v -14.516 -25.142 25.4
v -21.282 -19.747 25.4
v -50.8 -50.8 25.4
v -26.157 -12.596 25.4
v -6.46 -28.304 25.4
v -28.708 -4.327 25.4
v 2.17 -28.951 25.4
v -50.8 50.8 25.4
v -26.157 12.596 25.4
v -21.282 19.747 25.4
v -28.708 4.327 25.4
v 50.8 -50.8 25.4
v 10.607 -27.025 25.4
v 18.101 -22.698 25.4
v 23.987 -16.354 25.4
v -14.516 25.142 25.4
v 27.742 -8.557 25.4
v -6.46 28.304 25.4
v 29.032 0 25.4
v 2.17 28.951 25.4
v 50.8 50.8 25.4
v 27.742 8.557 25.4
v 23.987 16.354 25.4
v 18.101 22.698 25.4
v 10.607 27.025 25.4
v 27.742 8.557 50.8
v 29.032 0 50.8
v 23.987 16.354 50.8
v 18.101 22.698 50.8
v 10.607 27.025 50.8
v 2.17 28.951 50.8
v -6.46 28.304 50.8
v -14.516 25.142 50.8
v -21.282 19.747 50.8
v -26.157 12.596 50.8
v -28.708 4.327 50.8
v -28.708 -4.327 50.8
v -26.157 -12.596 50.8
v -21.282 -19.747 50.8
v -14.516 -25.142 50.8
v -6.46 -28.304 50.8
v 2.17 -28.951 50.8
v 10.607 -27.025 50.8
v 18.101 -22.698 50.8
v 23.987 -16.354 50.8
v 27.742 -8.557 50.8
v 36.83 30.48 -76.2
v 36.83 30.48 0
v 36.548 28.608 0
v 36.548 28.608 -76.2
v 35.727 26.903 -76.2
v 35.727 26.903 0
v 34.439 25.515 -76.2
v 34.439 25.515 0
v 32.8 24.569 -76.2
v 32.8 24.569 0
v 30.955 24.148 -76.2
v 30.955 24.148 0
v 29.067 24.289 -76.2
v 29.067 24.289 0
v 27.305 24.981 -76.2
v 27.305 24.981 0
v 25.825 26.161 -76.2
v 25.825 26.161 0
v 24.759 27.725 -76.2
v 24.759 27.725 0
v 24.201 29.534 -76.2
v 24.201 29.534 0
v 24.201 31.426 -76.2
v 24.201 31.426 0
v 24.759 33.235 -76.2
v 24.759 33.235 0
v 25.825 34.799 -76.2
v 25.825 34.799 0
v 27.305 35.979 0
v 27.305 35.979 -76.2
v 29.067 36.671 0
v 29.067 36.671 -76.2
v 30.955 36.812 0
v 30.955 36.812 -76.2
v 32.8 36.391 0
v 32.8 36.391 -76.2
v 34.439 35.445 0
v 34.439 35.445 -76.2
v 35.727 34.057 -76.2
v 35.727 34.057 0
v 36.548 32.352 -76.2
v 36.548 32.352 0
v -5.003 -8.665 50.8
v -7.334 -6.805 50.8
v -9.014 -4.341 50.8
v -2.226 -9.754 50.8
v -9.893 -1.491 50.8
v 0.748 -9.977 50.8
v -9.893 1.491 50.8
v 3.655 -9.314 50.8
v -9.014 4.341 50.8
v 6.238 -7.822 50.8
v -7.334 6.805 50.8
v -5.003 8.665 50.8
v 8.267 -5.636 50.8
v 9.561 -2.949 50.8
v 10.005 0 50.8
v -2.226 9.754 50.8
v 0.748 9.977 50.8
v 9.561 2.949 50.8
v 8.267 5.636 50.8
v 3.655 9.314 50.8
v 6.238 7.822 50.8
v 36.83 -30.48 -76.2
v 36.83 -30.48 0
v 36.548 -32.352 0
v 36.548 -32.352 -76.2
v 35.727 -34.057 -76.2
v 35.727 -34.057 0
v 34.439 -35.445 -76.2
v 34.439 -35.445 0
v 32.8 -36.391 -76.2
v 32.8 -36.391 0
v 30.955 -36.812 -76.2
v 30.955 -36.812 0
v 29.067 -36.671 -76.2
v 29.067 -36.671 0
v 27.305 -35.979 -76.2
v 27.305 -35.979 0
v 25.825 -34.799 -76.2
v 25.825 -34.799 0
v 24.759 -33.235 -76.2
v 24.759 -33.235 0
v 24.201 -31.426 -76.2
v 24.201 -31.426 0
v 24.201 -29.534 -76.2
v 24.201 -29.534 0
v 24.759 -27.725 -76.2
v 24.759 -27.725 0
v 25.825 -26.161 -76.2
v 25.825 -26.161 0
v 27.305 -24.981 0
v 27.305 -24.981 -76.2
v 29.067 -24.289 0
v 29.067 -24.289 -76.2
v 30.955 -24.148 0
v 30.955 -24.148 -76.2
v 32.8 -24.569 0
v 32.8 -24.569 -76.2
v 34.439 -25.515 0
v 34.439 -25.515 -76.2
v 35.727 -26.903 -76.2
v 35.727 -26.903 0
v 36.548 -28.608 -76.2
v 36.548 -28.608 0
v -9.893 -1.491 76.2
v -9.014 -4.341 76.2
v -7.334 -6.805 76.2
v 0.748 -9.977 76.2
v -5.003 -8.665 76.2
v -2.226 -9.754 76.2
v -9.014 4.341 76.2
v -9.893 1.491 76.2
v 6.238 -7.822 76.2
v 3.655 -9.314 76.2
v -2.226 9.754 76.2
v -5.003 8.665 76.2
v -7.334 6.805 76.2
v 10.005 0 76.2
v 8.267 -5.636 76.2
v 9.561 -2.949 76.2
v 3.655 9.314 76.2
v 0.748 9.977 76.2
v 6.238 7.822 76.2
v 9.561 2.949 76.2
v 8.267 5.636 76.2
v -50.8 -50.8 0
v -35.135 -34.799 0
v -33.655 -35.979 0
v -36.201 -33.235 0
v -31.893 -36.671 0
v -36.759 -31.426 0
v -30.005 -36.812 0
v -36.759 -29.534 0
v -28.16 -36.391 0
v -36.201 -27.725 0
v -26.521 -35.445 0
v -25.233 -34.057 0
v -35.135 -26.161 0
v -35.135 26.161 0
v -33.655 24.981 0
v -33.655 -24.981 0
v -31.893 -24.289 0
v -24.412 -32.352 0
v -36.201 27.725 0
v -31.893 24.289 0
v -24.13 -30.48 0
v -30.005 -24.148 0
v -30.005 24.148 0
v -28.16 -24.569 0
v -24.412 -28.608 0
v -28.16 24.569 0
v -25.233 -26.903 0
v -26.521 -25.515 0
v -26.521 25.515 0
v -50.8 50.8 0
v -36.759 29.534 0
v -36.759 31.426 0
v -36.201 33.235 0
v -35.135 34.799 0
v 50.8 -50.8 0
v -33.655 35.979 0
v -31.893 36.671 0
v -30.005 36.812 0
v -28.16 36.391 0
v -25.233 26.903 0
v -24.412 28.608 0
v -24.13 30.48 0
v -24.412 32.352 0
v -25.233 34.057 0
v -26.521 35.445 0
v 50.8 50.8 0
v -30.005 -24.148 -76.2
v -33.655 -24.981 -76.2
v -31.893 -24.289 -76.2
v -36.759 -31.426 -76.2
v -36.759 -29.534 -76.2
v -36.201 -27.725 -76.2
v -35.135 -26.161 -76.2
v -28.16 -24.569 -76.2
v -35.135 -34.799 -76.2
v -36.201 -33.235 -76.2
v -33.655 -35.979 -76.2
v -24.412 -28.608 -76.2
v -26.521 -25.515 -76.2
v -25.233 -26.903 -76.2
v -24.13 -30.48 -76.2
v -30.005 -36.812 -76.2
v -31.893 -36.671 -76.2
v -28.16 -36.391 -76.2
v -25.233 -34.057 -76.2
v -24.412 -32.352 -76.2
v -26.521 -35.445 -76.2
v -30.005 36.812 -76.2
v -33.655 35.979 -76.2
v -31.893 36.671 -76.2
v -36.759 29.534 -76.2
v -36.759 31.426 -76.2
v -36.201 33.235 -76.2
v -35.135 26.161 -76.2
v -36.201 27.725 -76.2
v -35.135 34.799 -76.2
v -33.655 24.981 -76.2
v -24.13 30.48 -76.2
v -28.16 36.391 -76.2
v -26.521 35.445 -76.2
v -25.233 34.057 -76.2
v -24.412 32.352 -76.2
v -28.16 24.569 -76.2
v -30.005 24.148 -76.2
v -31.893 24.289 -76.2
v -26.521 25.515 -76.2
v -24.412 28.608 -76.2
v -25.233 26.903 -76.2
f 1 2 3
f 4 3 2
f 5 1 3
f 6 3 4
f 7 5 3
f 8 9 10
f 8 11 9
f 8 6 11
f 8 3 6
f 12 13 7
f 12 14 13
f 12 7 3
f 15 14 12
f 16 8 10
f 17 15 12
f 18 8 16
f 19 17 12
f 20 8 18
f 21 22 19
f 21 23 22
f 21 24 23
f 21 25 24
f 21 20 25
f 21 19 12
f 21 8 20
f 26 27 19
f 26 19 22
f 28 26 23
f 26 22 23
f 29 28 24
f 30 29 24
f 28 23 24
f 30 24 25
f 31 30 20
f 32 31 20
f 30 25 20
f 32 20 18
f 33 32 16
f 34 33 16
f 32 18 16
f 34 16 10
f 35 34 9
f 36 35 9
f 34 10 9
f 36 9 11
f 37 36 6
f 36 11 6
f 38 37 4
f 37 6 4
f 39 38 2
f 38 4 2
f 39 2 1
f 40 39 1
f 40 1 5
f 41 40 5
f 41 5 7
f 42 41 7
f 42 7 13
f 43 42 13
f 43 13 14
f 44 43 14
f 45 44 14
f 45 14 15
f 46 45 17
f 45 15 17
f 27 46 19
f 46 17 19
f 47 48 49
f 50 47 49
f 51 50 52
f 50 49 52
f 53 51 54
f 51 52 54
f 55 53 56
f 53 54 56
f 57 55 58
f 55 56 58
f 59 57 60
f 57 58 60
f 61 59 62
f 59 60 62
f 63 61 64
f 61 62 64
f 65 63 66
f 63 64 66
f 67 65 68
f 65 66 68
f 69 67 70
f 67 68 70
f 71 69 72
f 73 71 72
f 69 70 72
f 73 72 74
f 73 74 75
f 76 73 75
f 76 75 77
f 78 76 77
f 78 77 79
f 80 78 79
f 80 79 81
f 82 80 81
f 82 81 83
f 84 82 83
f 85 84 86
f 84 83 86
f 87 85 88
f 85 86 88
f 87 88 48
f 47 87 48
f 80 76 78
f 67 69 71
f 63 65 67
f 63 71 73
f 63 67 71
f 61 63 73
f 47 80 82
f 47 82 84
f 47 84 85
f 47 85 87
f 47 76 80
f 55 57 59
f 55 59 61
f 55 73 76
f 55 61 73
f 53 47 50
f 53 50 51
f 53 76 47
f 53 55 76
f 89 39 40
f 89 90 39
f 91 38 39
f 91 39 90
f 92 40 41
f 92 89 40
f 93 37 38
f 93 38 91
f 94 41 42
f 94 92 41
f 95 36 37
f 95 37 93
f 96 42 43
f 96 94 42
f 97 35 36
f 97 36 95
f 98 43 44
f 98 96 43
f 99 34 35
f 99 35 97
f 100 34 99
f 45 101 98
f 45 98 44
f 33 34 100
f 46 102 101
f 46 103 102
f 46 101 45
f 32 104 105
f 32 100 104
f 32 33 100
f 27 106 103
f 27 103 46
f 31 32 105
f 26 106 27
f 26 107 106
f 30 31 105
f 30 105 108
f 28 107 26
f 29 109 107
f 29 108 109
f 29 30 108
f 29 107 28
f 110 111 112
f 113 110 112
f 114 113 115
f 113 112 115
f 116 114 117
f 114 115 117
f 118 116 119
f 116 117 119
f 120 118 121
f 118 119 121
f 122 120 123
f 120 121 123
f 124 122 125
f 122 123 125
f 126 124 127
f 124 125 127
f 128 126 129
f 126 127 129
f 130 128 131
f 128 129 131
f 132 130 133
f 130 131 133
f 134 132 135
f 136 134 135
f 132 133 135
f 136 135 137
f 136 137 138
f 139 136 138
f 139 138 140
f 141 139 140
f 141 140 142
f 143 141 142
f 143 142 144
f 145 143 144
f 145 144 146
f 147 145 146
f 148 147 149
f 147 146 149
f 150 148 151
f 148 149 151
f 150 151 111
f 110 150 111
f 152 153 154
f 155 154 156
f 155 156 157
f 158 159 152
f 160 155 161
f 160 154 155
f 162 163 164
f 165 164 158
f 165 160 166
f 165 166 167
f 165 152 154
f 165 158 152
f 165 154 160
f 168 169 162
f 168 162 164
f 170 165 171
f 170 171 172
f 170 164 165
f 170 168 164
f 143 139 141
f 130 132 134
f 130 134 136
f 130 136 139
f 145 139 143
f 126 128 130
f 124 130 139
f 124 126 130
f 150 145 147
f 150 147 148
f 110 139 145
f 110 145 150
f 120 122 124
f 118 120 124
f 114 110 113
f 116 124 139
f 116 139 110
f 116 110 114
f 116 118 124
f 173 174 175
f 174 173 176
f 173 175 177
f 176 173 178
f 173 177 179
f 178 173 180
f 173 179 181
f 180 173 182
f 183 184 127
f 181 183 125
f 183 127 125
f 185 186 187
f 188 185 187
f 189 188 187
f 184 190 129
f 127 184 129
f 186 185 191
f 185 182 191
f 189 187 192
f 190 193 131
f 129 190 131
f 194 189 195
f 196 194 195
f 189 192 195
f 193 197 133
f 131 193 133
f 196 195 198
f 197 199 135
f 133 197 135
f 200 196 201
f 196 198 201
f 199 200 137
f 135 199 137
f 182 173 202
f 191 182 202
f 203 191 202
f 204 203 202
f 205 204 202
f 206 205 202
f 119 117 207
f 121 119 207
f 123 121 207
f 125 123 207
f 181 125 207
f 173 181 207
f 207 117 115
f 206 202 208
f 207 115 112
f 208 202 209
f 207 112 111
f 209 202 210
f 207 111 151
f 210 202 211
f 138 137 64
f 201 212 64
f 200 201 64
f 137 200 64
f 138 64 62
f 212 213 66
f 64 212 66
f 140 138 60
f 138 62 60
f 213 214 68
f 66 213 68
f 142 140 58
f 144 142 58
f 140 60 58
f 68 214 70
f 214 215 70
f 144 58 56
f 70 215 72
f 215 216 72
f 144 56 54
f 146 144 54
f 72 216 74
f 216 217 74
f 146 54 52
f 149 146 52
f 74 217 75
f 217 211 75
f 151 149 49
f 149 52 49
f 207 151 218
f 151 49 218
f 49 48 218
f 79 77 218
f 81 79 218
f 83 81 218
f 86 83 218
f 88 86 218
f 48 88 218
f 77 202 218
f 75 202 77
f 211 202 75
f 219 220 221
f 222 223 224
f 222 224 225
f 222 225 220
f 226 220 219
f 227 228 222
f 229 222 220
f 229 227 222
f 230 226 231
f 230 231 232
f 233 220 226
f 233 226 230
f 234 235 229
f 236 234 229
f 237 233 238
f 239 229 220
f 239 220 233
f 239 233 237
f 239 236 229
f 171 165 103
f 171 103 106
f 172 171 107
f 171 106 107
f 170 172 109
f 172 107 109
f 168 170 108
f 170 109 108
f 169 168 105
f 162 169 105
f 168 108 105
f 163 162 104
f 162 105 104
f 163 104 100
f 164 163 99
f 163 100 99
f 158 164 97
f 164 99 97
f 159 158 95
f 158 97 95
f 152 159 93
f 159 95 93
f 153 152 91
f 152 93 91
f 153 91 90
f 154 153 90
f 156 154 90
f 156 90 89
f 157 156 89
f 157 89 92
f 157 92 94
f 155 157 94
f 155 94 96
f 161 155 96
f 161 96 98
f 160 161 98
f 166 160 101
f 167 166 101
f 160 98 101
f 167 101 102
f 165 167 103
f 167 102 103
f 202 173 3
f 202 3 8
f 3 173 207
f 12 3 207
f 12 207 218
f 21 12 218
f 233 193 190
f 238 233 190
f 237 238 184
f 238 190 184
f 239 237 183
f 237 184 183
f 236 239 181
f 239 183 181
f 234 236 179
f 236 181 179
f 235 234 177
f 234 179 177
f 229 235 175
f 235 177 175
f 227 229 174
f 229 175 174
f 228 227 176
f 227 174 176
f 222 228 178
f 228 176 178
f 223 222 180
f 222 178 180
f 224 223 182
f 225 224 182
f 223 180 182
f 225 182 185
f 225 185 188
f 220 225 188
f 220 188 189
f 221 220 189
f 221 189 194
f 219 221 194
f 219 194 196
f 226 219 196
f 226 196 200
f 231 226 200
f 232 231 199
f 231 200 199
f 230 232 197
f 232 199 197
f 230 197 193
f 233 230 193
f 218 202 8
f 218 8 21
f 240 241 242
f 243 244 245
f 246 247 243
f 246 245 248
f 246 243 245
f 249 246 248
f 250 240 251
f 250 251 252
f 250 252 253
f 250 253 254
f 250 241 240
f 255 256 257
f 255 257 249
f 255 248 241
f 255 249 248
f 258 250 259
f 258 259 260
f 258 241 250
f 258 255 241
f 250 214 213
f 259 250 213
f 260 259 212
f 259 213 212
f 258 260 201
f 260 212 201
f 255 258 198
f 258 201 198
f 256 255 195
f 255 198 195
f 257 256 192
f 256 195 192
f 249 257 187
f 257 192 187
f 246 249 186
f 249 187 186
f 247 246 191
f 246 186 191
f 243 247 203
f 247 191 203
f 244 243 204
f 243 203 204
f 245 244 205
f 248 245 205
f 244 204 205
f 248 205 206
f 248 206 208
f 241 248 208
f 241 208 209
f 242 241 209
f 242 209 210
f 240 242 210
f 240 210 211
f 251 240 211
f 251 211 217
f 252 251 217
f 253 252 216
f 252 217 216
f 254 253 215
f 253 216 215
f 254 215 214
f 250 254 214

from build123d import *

# Parameters (mm, degrees)
F0_W     = 101.6
F0_H     = 101.6
F1_DEPTH = 25.4
F2_R     = 29.031913
F3_DEPTH = 25.4
F4_R     = 6.35
F5_DEPTH = 76.2
F6_R     = 10.005143
F7_DEPTH = 25.4


with BuildPart() as f1:
    # F0 (on Top) → F1 (new body)
    with BuildSketch(Plane.XY):
        Rectangle(F0_W, F0_H)
    extrude(amount=F1_DEPTH)

    # F2 (on face) → F3 (join)
    with BuildSketch(Plane.XY.offset(25.4)):
        Circle(F2_R)
    extrude(amount=F3_DEPTH)

    # F4 (on face) → F5 (join)
    with BuildSketch(Plane(origin=(0, 0, 0), x_dir=(1, 0, 0), z_dir=(0, 0, -1))):
        with Locations((-30.48, 30.48)):
            Circle(F4_R)
        with Locations((30.48, 30.48)):
            Circle(F4_R)
        with Locations((30.48, -30.48)):
            Circle(F4_R)
        with Locations((-30.48, -30.48)):
            Circle(F4_R)
    extrude(amount=F5_DEPTH)

    # F6 (on face) → F7 (join)
    with BuildSketch(Plane.XY.offset(50.8)):
        Circle(F6_R)
    extrude(amount=F7_DEPTH)


solid = f1.part
